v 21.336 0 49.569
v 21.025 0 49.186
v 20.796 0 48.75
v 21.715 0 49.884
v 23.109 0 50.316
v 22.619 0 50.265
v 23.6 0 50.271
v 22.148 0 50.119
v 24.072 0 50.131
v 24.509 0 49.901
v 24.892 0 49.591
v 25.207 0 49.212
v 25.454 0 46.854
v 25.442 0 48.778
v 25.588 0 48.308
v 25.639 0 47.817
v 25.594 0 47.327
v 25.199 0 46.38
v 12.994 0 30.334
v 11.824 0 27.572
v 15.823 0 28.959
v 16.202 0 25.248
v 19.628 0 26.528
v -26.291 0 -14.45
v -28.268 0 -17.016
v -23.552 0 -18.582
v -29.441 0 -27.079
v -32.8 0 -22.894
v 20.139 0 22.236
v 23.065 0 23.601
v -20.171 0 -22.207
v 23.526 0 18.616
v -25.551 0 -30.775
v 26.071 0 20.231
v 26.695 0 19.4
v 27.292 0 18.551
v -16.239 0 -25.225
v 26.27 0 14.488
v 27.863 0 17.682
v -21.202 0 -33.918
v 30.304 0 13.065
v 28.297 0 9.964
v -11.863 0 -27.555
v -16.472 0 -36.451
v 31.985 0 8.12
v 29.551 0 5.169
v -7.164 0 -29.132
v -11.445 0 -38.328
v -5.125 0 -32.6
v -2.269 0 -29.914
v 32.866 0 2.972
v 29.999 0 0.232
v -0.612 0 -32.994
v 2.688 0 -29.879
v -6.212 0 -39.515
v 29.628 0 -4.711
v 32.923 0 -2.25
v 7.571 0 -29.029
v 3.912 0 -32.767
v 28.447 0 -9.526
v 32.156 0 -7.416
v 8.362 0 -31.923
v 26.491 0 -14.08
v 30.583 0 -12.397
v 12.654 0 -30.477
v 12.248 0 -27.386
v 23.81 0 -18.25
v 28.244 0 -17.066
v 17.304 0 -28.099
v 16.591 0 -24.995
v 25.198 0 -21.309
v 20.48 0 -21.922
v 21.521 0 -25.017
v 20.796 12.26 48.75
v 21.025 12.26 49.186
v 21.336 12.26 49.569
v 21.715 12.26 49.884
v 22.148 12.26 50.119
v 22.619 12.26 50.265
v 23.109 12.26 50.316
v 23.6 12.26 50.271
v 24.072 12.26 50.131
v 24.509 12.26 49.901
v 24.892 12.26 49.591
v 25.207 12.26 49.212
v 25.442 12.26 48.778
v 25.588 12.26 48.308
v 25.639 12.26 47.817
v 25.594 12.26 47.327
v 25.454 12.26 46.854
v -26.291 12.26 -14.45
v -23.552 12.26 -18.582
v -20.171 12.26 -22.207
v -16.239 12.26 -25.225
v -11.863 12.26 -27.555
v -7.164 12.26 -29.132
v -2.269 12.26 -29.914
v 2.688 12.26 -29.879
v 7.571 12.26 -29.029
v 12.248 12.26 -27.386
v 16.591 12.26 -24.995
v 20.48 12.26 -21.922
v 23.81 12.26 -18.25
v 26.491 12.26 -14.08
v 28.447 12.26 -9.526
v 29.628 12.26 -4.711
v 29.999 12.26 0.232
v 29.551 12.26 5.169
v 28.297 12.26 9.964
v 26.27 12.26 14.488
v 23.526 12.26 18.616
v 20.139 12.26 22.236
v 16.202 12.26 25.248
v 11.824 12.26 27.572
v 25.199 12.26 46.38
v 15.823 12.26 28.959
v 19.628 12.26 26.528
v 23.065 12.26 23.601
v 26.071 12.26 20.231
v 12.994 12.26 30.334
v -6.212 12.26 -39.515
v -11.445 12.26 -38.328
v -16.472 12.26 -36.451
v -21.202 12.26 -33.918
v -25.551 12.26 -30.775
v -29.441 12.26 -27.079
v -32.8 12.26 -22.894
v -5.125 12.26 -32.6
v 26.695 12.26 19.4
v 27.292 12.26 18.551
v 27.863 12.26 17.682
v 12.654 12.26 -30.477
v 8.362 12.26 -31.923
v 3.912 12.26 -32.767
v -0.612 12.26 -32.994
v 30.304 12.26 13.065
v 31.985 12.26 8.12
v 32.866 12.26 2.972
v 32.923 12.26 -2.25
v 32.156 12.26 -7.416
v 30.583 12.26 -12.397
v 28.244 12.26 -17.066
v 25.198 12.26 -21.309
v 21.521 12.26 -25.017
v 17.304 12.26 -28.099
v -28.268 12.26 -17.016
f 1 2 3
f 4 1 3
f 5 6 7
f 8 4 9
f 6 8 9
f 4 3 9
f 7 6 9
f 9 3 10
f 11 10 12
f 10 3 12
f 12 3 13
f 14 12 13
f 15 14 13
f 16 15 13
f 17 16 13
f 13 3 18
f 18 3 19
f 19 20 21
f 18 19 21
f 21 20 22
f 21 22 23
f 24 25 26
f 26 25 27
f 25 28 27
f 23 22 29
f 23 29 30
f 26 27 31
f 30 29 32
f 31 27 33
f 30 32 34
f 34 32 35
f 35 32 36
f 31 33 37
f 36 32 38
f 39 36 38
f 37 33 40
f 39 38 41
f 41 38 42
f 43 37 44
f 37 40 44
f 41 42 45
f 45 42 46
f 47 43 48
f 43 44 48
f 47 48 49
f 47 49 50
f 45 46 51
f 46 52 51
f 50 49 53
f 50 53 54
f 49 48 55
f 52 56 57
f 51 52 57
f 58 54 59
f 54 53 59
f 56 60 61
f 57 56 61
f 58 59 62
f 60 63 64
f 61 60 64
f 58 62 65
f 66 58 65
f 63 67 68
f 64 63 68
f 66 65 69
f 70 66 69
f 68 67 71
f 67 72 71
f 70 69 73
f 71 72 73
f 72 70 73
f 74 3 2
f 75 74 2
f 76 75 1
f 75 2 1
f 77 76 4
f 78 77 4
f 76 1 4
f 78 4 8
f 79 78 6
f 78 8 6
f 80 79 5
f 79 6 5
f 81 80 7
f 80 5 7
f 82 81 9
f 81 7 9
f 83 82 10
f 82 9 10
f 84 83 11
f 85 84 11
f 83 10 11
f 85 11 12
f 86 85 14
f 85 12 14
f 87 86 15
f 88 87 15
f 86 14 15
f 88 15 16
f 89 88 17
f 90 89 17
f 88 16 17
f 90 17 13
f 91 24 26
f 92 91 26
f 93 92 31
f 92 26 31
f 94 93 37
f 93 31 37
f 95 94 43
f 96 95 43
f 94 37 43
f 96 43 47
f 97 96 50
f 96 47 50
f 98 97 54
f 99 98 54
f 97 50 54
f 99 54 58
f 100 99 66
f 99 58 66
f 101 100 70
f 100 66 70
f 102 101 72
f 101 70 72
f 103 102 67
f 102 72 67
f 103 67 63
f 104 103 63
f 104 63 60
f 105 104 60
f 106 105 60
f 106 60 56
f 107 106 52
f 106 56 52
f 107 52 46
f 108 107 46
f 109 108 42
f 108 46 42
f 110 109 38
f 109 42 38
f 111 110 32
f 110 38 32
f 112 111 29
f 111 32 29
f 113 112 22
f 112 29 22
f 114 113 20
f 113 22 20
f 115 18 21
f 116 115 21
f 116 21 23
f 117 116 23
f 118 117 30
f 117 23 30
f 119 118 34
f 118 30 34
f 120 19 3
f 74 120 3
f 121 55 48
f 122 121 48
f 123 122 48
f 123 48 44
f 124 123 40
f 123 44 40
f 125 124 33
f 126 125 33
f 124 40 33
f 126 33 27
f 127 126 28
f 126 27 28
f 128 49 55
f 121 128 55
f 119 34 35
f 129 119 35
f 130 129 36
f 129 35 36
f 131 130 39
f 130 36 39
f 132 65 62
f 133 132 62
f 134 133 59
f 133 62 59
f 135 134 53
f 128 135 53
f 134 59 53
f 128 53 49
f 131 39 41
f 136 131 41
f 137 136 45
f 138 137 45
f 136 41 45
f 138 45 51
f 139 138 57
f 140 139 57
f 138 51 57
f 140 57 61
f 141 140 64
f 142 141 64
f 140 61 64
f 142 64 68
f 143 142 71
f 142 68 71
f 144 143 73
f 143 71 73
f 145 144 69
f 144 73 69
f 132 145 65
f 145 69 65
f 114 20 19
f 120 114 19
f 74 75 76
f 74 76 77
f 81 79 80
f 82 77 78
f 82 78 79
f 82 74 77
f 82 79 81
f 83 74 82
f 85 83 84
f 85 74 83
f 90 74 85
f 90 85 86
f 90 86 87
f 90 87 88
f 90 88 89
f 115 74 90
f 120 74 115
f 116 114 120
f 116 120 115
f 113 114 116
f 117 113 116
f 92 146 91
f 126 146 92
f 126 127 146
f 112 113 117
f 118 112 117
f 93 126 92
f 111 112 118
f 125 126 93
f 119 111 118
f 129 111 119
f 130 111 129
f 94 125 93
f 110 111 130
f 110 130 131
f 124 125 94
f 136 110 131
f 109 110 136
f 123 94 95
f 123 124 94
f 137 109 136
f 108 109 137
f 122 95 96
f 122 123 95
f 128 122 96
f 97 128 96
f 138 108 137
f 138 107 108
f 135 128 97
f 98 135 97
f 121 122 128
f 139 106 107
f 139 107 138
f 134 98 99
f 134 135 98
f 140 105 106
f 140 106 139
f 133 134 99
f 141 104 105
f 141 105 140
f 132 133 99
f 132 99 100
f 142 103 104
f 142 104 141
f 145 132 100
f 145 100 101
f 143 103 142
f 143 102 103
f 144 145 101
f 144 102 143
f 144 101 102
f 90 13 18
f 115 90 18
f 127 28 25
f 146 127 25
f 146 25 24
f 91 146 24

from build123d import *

# Parameters (mm, degrees)
RESSALTO_EXTRUS_O1_DEPTH = 12.26


with BuildPart() as part:
    # Esboço1 → Ressalto-extrusão1 (new body)
    with BuildSketch(Plane(origin=(0, 0, 0), x_dir=(1, 0, 0), z_dir=(0, 1, 0))):
        with BuildLine():
            Line((11.823645173, -27.571750304), (12.993920826, -30.334106573))
            Line((12.993920826, -30.334106573), (20.795690346, -48.749654144))
            ThreePointArc((20.795690346, -48.749654144), (24.072464244, -50.130779062), (25.453589161, -46.854005164))
            Line((25.453589161, -46.854005164), (25.198608413, -46.380200094))
            Line((25.198608413, -46.380200094), (15.823293166, -28.958995034))
            ThreePointArc((15.823293166, -28.958995034), (21.396881696, -25.123165678), (26.071005915, -20.231229586))
            ThreePointArc((26.071005915, -20.231229586), (26.997061933, -18.977846216), (27.862912529, -17.68214086))
            ThreePointArc((27.862912529, -17.68214086), (31.468158773, 9.937554199), (12.654282119, 30.477354611))
            ThreePointArc((12.654282119, 30.477354611), (3.9115652, 32.767356587), (-5.124534224, 32.599680198))
            Line((-5.124534224, 32.599680198), (-6.211556636, 39.514763876))
            ThreePointArc((-6.211556636, 39.514763876), (-21.202255924, 33.9184956), (-32.800073698, 22.894435249))
            Line((-32.800073698, 22.894435249), (-28.26846637, 17.015835516))
            Line((-28.26846637, 17.015835516), (-26.290601135, 14.450062005))
            ThreePointArc((-26.290601135, 14.450062005), (22.221192163, 20.154865886), (11.823645173, -27.571750304))
        make_face()
    extrude(amount=RESSALTO_EXTRUS_O1_DEPTH)


solid = part.part
